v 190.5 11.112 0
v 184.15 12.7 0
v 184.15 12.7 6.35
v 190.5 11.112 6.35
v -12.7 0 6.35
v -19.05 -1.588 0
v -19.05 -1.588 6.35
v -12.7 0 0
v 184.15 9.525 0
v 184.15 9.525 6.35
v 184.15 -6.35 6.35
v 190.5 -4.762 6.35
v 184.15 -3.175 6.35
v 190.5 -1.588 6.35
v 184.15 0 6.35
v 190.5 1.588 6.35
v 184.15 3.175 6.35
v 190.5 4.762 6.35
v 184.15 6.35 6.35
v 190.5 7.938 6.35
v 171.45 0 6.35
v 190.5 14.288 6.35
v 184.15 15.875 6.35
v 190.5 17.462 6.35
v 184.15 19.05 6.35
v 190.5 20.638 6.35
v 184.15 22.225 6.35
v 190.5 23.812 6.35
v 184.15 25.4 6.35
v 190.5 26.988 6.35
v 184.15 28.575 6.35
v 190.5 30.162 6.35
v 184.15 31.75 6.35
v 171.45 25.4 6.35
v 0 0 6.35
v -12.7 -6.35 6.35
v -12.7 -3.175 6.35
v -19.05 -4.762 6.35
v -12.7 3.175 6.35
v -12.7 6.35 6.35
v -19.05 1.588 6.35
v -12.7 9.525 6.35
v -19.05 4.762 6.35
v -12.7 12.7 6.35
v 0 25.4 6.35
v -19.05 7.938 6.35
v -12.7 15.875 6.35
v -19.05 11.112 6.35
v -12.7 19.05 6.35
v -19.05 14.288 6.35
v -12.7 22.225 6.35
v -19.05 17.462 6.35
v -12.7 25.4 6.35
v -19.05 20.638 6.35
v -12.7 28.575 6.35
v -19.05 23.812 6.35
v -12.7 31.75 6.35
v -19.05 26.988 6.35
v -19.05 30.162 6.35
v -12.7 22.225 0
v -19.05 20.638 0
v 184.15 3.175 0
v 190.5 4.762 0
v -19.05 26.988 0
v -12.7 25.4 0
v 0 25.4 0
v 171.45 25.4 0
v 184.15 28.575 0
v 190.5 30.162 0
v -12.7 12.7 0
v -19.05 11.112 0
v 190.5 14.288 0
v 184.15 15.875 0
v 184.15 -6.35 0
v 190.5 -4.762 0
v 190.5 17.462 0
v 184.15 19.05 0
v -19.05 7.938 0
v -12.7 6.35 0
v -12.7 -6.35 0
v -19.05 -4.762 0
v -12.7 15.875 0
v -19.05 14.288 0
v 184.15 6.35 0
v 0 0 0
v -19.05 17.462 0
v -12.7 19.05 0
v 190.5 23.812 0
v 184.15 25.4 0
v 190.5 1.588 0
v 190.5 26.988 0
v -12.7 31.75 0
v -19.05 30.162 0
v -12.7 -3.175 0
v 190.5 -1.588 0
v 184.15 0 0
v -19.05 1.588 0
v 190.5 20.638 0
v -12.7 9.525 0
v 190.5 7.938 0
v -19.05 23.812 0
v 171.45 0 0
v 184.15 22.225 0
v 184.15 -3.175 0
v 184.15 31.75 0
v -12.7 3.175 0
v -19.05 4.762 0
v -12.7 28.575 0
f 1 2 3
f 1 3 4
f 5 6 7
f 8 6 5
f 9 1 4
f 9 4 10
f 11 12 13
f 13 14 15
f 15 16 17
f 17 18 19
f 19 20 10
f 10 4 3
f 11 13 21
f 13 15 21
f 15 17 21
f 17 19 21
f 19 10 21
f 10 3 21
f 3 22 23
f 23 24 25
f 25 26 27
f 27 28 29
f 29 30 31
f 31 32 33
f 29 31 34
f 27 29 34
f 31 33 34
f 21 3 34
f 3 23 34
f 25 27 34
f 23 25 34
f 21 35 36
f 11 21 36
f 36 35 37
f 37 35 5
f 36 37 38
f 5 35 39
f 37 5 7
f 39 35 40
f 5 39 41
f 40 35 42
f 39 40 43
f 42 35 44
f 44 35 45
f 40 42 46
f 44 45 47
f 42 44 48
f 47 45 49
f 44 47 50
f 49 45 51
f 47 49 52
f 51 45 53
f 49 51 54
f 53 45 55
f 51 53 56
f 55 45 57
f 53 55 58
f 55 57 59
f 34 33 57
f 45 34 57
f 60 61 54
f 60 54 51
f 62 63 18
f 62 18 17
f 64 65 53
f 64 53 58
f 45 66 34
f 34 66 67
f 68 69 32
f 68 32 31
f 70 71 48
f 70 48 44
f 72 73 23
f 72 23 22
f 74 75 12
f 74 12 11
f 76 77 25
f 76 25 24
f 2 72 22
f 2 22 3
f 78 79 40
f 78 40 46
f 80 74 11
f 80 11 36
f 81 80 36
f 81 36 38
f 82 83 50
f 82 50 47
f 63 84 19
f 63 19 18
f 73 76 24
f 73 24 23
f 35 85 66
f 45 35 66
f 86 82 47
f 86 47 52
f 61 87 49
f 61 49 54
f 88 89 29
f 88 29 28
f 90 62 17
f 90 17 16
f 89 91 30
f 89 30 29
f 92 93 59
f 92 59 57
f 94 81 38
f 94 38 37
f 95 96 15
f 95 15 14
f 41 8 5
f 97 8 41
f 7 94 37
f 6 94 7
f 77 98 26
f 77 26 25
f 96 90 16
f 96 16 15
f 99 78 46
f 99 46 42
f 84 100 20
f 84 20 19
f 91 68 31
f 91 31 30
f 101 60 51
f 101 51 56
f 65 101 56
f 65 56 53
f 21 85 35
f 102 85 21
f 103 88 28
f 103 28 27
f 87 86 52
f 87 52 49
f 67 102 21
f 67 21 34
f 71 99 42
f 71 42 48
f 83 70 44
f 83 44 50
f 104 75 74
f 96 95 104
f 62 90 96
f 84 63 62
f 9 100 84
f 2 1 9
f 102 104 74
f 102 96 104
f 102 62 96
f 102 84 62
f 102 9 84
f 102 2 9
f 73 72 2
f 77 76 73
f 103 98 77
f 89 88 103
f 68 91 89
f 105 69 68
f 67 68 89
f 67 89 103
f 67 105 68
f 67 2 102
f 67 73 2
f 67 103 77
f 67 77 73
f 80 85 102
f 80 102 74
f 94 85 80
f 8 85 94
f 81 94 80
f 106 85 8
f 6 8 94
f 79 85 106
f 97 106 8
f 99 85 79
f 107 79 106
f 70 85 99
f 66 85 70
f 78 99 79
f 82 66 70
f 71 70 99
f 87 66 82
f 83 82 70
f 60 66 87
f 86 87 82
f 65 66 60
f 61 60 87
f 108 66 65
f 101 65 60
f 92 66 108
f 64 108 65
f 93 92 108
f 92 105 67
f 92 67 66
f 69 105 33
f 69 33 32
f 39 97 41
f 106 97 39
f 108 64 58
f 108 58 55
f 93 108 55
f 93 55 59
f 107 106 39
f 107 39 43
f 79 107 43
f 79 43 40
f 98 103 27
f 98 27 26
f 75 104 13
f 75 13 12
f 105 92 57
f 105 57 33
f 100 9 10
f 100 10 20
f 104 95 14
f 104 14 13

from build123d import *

# Parameters (mm, degrees)
SKETCH1_W           = 171.45
SKETCH1_H           = 25.4
BOSS_EXTRUDE1_DEPTH = 6.35


with BuildPart() as part:
    # Sketch1 → Boss-Extrude1 (new body)
    with BuildSketch(Plane.XY):
        Polygon((-12.7, -6.35), (-19.05, -4.7625), (-12.7, -3.175), (-19.05, -1.5875), (-12.7, 0), (-19.05, 1.5875), (-12.7, 3.175), (-19.05, 4.7625), (-12.7, 6.35), (-19.05, 7.9375), (-12.7, 9.525), (-19.05, 11.1125), (-12.7, 12.7), (-19.05, 14.2875), (-12.7, 15.875), (-19.05, 17.4625), (-12.7, 19.05), (-19.05, 20.6375), (-12.7, 22.225), (-19.05, 23.8125), (-12.7, 25.4), (-19.05, 26.9875), (-12.7, 28.575), (-19.05, 30.1625), (-12.7, 31.75), (184.15, 31.75), (190.5, 30.1625), (184.15, 28.575), (190.5, 26.9875), (184.15, 25.4), (190.5, 23.8125), (184.15, 22.225), (190.5, 20.6375), (184.15, 19.05), (190.5, 17.4625), (184.15, 15.875), (190.5, 14.2875), (184.15, 12.7), (190.5, 11.1125), (184.15, 9.525), (190.5, 7.9375), (184.15, 6.35), (190.5, 4.7625), (184.15, 3.175), (190.5, 1.5875), (184.15, 0), (190.5, -1.5875), (184.15, -3.175), (190.5, -4.7625), (184.15, -6.35), align=None)
        with Locations((85.725, 12.7)):
            Rectangle(SKETCH1_W, SKETCH1_H, mode=Mode.SUBTRACT)
    extrude(amount=BOSS_EXTRUDE1_DEPTH)


solid = part.part
